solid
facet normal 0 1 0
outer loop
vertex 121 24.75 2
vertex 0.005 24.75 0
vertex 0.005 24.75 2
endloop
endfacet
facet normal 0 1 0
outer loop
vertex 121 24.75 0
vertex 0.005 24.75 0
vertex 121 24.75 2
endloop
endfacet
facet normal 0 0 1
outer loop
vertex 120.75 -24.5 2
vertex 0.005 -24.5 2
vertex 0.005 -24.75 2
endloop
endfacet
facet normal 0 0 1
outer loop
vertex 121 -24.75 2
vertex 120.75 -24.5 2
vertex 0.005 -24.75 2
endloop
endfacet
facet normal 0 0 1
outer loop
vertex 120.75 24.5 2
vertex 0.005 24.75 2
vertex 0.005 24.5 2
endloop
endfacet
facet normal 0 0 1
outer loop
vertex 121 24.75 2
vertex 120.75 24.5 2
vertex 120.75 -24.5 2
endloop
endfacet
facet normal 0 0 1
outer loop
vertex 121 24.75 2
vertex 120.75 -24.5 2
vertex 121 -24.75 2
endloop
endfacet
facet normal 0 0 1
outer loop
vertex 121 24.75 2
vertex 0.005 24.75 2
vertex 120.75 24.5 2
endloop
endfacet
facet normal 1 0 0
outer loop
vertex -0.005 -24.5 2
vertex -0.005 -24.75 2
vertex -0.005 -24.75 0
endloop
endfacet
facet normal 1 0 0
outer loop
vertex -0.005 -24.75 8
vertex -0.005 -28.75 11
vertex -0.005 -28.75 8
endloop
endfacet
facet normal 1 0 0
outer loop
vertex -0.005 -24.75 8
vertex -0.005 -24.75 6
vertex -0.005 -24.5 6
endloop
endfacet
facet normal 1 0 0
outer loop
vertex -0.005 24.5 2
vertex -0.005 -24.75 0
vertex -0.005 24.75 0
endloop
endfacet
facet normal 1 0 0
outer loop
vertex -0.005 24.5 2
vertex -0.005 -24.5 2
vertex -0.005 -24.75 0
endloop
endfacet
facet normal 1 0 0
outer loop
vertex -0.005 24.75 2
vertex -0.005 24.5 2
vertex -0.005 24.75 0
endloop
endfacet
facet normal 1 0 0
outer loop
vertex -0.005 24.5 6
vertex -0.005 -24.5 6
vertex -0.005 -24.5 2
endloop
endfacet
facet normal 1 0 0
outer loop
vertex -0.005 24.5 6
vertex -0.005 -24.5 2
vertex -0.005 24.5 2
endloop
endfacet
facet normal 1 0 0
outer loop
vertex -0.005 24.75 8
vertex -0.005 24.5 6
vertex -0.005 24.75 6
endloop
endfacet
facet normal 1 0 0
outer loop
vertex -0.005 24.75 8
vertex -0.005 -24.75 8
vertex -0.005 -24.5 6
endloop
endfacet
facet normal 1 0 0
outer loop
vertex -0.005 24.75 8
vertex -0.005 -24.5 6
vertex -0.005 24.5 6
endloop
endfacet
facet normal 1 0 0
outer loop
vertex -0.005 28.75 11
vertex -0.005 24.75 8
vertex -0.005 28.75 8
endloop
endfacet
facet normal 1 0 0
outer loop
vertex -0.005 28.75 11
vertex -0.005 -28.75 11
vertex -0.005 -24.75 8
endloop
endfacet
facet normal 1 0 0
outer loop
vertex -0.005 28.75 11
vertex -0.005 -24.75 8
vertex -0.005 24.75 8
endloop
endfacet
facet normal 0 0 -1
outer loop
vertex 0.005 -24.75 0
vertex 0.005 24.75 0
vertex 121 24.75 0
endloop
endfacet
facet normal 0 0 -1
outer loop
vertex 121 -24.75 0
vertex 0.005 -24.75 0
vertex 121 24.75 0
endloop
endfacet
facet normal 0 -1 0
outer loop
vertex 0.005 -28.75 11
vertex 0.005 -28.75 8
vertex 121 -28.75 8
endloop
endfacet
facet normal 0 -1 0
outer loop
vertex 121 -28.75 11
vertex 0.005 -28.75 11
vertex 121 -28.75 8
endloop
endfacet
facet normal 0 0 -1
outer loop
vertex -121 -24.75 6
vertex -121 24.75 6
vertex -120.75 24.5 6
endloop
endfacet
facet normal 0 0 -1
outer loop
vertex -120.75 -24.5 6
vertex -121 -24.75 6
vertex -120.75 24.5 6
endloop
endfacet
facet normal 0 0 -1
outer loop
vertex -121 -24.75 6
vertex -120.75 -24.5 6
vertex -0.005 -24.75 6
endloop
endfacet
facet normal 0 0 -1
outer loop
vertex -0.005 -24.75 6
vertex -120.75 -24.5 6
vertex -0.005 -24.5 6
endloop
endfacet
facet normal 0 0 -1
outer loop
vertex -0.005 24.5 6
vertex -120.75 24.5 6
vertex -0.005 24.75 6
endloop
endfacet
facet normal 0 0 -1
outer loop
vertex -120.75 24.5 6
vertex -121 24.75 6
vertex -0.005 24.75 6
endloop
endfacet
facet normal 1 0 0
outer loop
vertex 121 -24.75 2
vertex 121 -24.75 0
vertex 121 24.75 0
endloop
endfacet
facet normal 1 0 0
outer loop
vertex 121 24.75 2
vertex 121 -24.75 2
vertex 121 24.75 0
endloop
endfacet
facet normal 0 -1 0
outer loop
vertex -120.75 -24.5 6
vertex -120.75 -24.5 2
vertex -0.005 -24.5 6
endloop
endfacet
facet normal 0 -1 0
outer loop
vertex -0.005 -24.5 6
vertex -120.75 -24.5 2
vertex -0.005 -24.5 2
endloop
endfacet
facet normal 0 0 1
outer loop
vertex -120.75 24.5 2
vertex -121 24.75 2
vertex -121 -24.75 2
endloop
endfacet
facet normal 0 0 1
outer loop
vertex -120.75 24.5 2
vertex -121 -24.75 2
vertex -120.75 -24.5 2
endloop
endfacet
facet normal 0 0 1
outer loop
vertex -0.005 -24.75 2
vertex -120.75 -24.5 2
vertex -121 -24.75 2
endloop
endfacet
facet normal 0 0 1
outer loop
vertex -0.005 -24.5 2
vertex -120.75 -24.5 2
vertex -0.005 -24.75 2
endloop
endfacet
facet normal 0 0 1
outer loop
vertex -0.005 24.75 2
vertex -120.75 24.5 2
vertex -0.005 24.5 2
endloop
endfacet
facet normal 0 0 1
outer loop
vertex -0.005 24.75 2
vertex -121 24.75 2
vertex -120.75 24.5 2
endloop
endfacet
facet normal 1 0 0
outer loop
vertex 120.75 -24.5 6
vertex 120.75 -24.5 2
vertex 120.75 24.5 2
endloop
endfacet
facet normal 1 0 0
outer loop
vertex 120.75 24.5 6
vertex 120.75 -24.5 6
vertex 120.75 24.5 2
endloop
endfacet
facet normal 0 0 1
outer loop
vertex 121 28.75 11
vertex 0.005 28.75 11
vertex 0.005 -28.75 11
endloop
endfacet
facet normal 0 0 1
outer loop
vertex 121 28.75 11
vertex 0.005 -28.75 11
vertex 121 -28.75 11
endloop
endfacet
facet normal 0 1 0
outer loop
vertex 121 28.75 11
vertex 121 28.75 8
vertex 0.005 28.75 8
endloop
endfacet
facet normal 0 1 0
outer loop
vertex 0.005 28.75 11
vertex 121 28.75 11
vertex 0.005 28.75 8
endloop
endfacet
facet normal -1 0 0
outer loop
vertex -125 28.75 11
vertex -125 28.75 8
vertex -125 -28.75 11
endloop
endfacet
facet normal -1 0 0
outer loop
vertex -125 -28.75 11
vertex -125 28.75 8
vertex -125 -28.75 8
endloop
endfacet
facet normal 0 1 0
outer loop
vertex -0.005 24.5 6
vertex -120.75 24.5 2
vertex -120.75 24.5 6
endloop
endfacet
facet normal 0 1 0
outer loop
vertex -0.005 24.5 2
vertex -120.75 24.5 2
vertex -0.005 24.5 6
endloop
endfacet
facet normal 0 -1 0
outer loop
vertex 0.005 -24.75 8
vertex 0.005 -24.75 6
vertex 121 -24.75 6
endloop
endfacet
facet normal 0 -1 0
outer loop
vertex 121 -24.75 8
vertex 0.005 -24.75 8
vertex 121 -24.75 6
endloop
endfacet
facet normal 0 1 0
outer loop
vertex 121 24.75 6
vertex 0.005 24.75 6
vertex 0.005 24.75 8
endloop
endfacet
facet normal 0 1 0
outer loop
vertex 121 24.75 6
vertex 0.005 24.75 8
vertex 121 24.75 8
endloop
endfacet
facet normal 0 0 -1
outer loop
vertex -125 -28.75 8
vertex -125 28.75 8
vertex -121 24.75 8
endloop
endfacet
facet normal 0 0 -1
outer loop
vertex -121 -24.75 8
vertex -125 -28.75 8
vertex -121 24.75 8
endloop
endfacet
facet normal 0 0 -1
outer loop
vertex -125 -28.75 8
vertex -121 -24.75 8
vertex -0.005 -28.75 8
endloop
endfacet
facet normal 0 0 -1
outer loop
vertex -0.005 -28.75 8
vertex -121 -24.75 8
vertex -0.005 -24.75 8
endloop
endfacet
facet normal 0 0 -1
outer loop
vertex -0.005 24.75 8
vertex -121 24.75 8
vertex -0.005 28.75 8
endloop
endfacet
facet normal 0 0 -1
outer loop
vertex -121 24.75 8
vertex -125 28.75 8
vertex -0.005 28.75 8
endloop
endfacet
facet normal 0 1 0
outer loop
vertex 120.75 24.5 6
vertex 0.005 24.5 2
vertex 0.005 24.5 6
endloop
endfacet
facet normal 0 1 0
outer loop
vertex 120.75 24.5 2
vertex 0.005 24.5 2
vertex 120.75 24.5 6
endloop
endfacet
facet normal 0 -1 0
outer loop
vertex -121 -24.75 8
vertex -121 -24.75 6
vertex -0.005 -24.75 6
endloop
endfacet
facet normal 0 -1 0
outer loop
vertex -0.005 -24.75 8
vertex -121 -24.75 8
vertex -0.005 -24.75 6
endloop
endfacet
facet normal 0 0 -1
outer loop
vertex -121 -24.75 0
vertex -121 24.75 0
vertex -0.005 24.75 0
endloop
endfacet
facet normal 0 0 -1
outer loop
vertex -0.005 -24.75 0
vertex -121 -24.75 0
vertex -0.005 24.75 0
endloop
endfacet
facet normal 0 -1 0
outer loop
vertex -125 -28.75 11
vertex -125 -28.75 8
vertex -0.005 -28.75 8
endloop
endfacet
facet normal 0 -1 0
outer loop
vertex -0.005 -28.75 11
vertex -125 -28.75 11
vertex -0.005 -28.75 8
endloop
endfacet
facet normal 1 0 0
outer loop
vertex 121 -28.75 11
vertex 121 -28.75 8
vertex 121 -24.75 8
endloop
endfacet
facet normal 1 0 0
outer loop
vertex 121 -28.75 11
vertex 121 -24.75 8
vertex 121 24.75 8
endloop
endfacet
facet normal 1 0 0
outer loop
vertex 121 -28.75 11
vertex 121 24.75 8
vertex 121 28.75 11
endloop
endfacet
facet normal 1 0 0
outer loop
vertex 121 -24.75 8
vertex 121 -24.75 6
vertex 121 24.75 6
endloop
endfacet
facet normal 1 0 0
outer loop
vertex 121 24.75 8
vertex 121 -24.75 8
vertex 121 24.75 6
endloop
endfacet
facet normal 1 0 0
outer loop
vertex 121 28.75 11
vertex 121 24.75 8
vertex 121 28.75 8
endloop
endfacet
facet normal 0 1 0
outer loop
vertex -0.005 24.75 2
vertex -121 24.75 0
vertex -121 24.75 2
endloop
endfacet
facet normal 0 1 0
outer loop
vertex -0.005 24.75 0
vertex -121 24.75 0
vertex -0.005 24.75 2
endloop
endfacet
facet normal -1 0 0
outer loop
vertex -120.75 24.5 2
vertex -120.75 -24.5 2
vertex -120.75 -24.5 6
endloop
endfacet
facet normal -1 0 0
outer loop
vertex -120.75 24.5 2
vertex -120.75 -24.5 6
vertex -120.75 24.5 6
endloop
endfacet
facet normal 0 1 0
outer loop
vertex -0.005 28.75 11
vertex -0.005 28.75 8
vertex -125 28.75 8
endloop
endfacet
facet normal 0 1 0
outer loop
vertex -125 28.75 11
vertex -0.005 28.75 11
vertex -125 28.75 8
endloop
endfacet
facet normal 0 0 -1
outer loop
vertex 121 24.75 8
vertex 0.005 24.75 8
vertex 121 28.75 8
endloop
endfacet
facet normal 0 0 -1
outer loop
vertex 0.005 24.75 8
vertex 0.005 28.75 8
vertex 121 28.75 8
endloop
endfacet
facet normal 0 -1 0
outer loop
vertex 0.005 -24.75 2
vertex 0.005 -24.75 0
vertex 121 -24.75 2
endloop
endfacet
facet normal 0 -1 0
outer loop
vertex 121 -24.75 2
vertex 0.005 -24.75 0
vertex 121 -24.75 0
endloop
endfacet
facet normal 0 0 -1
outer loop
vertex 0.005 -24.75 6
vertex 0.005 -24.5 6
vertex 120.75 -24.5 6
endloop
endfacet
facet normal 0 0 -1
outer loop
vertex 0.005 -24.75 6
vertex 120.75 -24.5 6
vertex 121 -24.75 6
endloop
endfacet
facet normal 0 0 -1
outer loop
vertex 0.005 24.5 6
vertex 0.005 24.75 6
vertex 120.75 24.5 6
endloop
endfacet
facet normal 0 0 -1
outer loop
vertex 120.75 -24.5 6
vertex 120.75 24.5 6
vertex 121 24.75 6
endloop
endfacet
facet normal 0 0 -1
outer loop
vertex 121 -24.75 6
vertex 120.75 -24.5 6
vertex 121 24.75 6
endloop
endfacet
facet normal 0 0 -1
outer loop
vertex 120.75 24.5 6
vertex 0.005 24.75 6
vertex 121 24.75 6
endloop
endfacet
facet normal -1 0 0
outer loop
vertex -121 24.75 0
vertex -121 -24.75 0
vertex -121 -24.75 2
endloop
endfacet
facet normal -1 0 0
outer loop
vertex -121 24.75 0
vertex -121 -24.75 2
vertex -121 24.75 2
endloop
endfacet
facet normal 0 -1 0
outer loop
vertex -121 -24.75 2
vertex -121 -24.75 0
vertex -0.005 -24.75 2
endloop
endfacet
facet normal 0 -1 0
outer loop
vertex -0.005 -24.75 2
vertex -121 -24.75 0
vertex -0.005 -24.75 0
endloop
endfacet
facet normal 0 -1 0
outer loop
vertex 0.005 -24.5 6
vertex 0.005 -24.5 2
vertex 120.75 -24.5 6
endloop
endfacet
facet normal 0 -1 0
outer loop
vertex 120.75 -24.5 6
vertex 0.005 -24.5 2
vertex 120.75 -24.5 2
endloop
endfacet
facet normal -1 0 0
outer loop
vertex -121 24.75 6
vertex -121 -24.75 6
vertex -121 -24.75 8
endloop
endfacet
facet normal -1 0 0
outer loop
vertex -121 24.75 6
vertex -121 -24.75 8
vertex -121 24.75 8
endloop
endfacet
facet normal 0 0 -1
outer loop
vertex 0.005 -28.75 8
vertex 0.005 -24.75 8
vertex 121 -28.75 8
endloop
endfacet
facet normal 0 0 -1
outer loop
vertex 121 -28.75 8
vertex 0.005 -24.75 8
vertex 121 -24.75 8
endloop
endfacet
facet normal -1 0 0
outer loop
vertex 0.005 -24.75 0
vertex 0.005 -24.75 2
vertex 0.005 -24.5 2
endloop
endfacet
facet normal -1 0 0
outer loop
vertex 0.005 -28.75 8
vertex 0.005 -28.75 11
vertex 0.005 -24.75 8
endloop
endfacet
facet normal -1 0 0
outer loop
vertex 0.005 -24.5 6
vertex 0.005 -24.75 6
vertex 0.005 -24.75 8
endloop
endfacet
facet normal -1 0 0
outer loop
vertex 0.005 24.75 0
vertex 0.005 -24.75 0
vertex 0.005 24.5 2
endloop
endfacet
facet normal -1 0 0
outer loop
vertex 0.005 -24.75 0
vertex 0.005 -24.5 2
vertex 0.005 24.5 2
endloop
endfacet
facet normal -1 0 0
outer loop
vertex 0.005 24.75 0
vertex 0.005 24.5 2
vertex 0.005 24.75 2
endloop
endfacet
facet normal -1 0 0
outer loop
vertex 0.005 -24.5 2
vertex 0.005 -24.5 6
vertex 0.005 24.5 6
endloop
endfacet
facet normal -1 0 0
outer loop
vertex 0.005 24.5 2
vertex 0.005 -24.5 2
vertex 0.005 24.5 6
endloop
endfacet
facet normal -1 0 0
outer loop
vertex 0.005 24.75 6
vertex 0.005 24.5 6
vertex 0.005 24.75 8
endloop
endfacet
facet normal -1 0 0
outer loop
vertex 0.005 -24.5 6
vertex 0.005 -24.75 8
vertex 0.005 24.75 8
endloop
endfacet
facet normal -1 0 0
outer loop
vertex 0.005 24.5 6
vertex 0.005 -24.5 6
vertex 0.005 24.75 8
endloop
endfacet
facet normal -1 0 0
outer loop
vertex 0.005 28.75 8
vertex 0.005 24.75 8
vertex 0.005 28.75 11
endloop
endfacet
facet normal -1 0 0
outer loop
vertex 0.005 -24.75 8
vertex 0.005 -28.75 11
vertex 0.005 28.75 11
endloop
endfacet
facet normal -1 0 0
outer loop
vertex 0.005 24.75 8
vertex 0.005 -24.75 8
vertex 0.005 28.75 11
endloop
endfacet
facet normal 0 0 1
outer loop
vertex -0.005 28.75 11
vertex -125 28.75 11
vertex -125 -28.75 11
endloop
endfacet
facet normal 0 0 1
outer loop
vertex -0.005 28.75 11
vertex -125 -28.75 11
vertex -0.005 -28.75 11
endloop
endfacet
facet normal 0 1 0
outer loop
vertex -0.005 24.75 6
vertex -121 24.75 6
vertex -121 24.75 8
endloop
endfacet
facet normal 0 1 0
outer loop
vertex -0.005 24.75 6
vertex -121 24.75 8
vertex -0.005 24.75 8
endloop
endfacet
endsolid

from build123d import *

# Parameters (mm, degrees)
F0_W     = 242
F0_H     = 49.5
F1_DEPTH = 2
F2_W     = 241.5
F2_H     = 49
F3_DEPTH = 4
F4_W     = 242
F4_H     = 49.5
F5_DEPTH = 2
F6_W     = 242
F6_H     = 4
F6_H_2   = 49.5
F7_DEPTH = 3
F8_W     = 0.01
F8_H     = 57.5
F9_DEPTH = 25


with BuildPart() as f1:
    # F0 (on Top) → F1 (new body)
    with BuildSketch(Plane.XY):
        Rectangle(F0_W, F0_H)
    extrude(amount=F1_DEPTH)

    # F2 (on face) → F3 (join)
    with BuildSketch(Plane.XY.offset(2)):
        Rectangle(F2_W, F2_H)
    extrude(amount=F3_DEPTH)

    # F4 (on face) → F5 (join)
    with BuildSketch(Plane.XY.offset(6)):
        Rectangle(F4_W, F4_H)
    extrude(amount=F5_DEPTH)

    # F6 (on face) → F7 (join)
    with BuildSketch(Plane.XY.offset(8)):
        with Locations((0, 26.75)):
            Rectangle(F6_W, F6_H)
        Polygon((-121, -24.75), (-121, 24.75), (-121, 28.75), (-125, 28.75), (-125, -28.75), (-121, -28.75), align=None)
        with Locations((0, -26.75)):
            Rectangle(F6_W, F6_H)
        Rectangle(F6_W, F6_H_2)
    extrude(amount=F7_DEPTH)

    # F8 (on face) → F9 (cut)
    with BuildSketch(Plane.XY.offset(11)):
        Rectangle(F8_W, F8_H)
    extrude(amount=-F9_DEPTH, mode=Mode.SUBTRACT)


solid = f1.part
